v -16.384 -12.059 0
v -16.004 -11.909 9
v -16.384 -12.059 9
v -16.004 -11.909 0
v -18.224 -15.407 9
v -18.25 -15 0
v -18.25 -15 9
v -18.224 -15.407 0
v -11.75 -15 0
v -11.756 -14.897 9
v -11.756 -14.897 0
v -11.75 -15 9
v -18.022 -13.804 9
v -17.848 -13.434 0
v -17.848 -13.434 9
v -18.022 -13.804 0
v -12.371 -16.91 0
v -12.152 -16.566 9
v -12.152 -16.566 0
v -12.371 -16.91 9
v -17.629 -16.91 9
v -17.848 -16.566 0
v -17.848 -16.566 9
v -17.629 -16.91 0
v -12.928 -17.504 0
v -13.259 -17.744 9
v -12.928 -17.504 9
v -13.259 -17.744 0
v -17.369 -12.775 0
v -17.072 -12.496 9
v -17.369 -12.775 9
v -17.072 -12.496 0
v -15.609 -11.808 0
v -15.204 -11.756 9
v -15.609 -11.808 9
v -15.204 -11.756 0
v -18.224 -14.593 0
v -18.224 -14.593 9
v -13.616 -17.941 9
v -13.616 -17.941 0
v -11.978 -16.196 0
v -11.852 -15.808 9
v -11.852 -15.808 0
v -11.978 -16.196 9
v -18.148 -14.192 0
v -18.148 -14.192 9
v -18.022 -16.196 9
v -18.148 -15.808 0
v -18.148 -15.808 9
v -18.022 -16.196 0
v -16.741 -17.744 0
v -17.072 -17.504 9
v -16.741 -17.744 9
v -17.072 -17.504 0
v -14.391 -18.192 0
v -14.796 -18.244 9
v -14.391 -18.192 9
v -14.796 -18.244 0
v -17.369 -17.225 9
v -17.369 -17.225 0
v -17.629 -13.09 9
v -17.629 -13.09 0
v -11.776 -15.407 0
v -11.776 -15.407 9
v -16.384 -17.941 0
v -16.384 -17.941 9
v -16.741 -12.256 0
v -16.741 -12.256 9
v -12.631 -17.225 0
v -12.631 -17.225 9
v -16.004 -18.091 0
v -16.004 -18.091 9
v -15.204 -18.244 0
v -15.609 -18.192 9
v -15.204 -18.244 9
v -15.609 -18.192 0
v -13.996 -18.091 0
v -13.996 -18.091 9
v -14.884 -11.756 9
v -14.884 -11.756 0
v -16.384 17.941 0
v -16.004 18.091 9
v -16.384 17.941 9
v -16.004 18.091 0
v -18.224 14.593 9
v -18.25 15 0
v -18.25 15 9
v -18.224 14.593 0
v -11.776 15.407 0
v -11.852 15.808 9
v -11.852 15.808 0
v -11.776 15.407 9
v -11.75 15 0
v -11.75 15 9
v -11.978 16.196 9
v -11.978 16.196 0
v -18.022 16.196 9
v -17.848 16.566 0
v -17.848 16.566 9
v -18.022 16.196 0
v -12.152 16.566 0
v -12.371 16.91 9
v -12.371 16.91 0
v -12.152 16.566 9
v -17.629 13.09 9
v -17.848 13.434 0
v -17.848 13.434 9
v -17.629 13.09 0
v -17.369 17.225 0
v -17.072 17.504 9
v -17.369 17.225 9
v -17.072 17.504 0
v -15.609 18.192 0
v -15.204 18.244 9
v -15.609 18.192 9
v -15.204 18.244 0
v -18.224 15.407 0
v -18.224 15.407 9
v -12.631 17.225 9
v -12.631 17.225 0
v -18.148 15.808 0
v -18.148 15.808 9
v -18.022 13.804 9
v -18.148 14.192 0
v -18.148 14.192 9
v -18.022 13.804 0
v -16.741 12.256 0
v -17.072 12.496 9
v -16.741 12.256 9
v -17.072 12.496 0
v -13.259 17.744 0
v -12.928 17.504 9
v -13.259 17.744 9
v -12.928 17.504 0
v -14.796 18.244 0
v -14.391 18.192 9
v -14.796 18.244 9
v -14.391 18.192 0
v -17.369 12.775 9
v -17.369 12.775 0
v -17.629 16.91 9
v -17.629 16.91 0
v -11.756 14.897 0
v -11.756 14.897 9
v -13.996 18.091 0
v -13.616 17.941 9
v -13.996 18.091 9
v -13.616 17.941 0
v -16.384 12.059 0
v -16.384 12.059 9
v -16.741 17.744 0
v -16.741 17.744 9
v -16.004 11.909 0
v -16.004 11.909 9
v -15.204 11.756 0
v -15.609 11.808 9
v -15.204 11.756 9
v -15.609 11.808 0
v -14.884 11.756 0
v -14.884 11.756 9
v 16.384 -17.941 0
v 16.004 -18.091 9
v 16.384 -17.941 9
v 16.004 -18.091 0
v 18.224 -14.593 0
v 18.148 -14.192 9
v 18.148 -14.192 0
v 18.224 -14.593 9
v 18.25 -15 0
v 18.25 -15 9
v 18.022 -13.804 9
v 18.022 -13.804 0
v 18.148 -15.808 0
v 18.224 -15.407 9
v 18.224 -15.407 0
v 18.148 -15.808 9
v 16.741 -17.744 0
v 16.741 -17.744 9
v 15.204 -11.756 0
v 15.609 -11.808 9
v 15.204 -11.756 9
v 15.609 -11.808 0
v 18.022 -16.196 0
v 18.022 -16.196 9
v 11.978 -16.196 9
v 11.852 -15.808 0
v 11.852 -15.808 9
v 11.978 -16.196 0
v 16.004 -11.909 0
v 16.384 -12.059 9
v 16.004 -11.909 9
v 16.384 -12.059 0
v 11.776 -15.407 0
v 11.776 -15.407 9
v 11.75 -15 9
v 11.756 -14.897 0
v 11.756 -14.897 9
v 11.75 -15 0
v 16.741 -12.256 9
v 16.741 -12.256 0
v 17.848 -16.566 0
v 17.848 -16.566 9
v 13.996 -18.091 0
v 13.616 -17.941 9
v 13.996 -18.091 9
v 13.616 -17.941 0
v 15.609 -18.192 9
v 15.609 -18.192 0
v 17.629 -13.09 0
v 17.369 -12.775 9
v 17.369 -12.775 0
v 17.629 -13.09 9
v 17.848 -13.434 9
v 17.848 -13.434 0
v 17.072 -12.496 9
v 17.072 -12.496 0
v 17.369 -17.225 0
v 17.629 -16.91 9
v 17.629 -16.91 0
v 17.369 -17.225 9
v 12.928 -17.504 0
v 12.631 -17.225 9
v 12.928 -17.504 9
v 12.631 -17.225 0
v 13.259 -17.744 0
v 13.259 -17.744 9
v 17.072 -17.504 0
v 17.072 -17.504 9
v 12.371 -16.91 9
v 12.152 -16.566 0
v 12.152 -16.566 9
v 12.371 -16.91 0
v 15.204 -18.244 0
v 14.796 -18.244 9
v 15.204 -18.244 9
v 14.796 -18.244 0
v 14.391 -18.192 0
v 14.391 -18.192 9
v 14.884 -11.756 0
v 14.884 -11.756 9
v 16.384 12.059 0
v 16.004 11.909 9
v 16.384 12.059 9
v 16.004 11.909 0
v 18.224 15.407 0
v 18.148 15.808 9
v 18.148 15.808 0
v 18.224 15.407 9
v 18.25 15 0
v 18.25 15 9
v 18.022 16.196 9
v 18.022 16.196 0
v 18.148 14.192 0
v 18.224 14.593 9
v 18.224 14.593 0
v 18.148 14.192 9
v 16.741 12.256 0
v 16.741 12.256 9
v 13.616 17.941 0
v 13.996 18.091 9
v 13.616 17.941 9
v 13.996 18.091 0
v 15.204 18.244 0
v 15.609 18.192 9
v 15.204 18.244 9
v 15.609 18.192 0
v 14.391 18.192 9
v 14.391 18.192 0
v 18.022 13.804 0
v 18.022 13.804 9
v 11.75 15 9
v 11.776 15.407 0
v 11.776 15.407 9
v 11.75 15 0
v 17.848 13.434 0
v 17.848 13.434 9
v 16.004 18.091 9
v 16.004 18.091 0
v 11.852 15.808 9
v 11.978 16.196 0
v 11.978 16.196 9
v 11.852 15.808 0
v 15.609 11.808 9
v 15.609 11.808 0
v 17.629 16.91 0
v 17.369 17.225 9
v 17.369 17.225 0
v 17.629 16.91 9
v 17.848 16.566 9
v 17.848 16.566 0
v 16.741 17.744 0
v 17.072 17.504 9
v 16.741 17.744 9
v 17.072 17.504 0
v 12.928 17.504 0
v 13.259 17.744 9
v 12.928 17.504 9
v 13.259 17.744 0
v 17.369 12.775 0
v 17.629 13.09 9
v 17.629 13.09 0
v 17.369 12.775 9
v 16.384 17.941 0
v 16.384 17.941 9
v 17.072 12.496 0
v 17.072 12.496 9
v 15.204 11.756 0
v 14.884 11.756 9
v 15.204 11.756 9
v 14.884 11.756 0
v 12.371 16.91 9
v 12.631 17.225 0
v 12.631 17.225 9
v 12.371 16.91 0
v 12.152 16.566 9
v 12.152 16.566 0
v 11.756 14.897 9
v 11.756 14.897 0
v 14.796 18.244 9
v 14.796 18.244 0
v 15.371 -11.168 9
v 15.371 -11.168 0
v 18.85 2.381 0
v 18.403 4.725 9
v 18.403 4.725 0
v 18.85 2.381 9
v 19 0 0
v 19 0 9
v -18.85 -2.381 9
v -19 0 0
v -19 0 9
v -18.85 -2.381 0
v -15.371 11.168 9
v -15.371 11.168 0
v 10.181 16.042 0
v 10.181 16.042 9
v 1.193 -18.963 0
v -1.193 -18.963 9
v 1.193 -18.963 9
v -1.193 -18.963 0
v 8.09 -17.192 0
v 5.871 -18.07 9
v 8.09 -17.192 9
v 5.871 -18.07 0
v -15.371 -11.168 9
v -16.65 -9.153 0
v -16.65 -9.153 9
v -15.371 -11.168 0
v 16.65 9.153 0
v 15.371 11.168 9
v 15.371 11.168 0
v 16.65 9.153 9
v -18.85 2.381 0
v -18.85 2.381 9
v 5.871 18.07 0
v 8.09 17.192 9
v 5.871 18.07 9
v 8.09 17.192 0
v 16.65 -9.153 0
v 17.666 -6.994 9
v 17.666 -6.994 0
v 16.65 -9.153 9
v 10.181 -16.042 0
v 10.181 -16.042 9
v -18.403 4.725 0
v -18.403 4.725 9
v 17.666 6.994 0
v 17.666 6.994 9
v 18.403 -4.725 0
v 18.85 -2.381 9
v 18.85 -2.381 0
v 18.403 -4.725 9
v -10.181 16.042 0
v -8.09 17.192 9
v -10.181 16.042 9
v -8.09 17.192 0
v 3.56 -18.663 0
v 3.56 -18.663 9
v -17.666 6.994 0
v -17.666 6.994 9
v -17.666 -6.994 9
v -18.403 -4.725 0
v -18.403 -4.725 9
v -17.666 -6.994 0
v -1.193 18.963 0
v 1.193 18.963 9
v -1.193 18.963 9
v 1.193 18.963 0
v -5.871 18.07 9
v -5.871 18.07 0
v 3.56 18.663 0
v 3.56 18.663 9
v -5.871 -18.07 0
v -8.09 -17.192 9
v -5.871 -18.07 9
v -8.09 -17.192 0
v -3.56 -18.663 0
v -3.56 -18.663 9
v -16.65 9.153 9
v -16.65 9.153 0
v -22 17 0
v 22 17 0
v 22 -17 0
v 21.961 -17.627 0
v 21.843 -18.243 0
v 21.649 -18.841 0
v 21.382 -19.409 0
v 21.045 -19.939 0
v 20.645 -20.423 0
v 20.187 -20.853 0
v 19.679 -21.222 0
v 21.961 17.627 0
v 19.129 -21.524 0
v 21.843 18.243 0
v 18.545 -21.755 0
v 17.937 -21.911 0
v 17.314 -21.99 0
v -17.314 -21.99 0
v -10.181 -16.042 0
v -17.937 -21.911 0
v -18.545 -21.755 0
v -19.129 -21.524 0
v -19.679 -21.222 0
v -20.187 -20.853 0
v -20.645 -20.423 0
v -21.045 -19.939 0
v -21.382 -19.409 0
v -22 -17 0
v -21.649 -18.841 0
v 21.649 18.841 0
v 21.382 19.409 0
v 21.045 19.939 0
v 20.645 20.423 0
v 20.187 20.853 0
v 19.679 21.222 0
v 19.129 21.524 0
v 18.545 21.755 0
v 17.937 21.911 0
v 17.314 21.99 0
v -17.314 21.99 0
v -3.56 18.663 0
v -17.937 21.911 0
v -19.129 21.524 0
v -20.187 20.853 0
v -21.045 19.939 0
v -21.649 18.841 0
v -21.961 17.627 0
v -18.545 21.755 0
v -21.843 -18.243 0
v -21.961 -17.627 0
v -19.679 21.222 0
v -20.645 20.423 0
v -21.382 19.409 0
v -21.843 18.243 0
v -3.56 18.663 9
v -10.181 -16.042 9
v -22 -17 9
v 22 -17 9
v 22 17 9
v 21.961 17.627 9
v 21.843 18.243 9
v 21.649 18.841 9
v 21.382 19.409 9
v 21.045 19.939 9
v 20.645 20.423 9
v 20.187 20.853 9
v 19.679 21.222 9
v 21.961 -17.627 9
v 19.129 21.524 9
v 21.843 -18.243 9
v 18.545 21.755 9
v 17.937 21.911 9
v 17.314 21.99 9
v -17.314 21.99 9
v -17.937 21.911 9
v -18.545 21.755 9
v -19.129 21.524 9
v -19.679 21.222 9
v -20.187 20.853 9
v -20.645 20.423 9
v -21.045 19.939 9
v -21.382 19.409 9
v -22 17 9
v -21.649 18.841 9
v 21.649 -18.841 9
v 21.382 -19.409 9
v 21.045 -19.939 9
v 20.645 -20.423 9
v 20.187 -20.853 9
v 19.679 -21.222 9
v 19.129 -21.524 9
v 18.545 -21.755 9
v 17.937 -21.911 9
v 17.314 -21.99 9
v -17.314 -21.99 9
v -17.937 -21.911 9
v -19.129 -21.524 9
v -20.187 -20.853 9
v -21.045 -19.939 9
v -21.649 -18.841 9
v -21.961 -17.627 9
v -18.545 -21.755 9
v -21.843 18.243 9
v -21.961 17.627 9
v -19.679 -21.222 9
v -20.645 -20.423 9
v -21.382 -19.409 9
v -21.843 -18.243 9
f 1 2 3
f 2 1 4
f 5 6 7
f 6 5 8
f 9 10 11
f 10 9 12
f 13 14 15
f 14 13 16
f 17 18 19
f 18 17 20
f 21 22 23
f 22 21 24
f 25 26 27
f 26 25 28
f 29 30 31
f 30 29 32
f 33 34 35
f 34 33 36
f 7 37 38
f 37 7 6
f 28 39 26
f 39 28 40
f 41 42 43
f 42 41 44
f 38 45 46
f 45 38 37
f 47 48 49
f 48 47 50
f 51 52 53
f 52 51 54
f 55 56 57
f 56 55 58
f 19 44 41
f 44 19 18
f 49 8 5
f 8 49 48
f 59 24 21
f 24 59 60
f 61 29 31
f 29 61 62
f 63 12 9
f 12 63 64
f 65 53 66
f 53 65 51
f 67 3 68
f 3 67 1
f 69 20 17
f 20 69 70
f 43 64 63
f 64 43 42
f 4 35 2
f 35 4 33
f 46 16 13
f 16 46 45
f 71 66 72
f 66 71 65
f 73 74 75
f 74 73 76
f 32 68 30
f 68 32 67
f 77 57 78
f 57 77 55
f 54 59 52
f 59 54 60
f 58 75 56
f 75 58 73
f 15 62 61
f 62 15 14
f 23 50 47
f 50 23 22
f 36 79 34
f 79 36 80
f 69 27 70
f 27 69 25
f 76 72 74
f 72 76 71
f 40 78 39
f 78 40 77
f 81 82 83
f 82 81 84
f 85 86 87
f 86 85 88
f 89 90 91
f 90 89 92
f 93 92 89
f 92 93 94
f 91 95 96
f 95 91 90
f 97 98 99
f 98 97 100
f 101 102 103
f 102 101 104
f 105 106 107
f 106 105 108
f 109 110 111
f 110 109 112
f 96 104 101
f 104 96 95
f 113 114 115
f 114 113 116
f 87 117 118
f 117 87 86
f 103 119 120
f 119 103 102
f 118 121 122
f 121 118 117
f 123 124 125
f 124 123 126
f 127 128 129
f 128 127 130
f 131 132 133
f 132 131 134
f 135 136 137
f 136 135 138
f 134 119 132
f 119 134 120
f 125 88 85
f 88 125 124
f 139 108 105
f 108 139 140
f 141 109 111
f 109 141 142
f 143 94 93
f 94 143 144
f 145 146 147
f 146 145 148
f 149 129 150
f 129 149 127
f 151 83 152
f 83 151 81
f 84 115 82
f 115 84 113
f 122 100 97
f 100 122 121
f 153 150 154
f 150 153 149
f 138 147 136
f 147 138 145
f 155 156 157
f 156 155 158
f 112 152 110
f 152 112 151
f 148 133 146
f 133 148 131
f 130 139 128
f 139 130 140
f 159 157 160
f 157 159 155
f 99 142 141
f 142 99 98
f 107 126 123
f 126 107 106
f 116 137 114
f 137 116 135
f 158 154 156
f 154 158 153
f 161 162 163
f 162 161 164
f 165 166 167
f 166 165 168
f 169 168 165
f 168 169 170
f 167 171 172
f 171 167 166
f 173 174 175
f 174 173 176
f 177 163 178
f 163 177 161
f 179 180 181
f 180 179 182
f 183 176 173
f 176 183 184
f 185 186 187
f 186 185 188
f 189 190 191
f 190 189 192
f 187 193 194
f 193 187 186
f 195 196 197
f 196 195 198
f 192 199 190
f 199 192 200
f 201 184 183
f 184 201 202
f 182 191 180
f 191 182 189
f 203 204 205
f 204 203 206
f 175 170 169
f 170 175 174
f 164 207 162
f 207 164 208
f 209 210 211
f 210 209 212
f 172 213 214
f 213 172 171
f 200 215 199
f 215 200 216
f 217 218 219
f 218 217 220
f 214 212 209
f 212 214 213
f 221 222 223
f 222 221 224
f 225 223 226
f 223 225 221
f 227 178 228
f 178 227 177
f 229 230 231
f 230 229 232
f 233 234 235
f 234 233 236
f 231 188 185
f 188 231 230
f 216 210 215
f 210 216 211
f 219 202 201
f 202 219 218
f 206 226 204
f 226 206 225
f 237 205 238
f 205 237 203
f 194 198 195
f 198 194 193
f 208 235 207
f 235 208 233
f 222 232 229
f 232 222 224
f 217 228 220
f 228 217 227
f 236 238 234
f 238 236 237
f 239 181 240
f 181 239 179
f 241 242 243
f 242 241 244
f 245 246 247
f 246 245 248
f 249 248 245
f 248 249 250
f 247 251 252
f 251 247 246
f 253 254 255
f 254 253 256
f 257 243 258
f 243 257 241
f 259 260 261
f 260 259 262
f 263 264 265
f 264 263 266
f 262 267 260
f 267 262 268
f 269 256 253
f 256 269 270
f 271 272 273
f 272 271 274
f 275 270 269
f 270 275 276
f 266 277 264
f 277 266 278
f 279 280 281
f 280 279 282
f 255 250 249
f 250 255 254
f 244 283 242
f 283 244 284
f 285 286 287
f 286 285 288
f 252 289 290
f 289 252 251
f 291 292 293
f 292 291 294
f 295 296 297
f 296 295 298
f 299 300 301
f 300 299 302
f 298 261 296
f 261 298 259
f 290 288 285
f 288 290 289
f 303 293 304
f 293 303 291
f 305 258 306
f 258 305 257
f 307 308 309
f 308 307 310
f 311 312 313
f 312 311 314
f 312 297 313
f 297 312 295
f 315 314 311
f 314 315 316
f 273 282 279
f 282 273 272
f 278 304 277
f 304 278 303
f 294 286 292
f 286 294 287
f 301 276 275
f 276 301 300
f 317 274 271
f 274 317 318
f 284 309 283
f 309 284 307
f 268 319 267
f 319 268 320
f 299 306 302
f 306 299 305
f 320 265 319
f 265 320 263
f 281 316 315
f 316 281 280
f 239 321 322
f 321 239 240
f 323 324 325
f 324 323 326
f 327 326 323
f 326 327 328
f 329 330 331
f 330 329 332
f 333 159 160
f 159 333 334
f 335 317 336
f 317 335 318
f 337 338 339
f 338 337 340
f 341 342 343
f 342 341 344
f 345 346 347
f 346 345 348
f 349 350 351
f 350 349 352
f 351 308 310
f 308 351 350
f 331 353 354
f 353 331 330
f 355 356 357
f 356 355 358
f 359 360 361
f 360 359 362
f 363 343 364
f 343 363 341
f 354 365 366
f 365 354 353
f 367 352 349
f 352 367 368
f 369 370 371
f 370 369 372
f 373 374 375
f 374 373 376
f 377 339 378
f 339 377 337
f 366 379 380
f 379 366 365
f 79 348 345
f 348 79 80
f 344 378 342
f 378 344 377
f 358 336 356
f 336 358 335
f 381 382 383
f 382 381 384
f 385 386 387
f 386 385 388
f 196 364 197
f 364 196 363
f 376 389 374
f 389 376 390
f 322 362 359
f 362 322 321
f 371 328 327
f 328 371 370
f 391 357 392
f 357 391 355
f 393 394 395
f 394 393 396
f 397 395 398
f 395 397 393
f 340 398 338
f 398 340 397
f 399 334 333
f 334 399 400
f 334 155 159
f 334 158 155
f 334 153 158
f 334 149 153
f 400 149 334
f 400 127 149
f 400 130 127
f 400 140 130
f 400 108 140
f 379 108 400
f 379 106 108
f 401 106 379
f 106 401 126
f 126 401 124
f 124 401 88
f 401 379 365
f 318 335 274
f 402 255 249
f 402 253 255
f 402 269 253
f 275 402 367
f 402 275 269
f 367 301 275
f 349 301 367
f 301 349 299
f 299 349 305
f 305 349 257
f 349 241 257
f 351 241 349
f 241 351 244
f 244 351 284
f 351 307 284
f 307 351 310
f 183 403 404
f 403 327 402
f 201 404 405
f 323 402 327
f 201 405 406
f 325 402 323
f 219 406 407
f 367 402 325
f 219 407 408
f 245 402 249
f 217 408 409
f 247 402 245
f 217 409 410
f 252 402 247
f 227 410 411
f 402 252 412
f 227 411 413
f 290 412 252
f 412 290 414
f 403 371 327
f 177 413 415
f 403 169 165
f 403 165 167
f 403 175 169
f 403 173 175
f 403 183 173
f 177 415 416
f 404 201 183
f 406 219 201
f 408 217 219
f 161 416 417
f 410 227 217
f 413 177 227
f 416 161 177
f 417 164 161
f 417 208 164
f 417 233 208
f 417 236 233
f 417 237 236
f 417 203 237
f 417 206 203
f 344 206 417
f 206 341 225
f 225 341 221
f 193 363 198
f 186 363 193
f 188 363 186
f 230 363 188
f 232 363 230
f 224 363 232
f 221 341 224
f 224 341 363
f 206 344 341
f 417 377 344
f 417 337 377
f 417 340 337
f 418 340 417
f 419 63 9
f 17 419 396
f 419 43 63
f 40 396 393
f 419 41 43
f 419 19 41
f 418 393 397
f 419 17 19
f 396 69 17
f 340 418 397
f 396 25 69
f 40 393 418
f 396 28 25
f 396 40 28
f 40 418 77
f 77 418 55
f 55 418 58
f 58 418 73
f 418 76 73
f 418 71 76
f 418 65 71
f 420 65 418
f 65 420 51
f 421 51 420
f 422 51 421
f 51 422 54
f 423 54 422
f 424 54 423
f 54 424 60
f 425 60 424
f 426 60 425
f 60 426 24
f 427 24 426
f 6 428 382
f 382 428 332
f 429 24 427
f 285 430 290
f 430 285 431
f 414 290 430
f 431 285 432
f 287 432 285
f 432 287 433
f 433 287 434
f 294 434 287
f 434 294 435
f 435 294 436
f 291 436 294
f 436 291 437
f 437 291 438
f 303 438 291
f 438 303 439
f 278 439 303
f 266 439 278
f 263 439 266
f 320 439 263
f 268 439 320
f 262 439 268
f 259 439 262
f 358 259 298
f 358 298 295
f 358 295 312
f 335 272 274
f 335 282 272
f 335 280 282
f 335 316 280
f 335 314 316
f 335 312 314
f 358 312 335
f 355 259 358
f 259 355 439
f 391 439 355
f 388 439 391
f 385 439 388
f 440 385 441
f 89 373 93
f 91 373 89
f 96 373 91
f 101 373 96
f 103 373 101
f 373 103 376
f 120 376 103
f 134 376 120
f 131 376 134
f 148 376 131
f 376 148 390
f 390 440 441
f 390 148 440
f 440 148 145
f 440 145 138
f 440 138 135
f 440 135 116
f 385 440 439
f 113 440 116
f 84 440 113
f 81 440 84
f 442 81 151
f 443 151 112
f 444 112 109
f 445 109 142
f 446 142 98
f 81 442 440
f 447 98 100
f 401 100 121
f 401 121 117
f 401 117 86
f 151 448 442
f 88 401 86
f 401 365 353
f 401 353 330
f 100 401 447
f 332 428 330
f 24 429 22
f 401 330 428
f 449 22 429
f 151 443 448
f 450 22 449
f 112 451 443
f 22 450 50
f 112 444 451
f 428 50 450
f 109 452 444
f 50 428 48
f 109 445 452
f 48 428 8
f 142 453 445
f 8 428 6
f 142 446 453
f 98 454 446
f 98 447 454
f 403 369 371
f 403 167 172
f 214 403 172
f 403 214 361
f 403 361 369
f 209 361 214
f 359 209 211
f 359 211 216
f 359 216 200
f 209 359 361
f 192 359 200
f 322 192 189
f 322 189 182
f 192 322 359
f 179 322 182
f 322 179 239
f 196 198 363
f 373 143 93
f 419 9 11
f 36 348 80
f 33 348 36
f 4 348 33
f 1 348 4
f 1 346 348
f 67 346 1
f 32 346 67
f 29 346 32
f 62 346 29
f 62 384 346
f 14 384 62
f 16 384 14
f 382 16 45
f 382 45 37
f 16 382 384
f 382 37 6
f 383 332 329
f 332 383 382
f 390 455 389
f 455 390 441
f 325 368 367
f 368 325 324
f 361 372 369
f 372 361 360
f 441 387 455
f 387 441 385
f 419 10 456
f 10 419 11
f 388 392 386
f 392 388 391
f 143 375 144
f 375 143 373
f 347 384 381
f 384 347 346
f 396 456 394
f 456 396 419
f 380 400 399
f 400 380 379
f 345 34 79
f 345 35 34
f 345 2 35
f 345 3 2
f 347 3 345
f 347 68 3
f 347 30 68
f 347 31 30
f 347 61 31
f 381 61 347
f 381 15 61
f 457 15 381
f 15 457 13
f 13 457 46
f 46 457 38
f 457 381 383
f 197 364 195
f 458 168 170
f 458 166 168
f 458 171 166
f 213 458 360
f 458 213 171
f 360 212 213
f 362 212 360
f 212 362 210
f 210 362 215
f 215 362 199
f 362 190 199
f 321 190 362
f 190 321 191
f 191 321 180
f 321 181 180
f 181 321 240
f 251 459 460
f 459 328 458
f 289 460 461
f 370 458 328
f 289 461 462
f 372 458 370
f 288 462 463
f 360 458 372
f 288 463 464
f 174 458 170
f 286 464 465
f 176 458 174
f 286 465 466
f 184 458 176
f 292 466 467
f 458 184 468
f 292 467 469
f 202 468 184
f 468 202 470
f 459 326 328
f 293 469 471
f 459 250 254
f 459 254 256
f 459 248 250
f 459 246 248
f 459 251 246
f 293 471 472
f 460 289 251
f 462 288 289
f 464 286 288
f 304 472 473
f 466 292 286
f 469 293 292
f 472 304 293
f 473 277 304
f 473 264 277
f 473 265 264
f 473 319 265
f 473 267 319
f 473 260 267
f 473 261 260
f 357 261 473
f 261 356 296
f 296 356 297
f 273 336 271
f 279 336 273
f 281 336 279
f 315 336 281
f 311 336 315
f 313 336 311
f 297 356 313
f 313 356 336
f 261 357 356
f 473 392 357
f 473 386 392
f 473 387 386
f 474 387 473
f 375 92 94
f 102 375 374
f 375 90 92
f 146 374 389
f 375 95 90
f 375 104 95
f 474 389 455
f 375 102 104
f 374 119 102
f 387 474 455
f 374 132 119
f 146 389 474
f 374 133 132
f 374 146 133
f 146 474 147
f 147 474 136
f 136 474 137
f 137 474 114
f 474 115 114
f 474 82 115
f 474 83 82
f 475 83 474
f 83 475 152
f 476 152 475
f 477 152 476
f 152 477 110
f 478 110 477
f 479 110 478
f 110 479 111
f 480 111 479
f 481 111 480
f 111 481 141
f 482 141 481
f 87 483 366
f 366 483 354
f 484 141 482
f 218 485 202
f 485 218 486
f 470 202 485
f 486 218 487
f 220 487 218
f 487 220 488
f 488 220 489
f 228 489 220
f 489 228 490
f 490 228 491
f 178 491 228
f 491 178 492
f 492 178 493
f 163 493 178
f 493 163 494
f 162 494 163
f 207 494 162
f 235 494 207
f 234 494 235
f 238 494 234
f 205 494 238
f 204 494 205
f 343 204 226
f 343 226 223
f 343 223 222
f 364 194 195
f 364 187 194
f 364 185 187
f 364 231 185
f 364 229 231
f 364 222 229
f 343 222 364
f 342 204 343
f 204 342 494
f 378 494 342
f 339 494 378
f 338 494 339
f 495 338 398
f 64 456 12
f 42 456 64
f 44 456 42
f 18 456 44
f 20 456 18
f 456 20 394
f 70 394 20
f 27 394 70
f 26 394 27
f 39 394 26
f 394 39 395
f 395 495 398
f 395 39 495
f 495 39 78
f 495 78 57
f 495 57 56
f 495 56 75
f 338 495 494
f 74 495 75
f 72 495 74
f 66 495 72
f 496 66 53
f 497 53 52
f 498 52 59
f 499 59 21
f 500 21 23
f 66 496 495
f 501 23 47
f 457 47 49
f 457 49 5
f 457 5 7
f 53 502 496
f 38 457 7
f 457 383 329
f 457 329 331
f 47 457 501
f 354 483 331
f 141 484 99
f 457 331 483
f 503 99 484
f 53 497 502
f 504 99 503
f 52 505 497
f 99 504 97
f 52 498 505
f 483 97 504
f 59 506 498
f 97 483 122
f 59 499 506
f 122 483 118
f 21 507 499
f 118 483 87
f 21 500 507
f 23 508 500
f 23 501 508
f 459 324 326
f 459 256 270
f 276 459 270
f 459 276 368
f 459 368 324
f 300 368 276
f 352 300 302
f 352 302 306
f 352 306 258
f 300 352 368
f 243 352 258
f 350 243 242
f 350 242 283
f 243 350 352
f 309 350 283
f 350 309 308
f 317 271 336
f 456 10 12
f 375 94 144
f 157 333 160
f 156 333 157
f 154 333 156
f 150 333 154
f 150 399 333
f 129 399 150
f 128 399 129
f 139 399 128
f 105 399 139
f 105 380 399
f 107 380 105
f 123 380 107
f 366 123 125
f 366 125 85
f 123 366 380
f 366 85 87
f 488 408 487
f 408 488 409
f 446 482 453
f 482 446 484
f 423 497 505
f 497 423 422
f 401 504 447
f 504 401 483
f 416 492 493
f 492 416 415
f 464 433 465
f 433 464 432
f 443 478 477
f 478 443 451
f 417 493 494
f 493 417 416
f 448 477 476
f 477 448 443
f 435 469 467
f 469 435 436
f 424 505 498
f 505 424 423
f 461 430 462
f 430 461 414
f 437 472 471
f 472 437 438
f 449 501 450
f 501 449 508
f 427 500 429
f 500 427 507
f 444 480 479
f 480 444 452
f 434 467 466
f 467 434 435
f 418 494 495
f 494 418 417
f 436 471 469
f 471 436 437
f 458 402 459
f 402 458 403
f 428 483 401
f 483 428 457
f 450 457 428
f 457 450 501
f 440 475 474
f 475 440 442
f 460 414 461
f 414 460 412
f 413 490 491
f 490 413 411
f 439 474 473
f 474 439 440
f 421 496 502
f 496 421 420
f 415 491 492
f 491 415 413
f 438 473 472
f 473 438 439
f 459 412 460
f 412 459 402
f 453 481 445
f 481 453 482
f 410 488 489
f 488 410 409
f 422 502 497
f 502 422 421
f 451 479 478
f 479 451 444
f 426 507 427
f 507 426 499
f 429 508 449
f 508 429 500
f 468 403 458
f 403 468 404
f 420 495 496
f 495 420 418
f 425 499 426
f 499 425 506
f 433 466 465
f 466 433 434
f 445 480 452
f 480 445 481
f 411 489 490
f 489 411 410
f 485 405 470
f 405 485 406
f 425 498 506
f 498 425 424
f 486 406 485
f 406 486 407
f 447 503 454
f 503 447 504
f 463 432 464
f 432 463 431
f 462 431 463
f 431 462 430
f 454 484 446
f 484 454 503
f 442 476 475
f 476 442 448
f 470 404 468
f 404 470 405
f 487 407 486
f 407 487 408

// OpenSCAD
$fn = 50;


difference() {
	union() {
		hull() {
			translate(v = [-17.0000000000, 17.0000000000, 0]) {
				cylinder(h = 9, r = 5);
			}
			translate(v = [17.0000000000, 17.0000000000, 0]) {
				cylinder(h = 9, r = 5);
			}
			translate(v = [-17.0000000000, -17.0000000000, 0]) {
				cylinder(h = 9, r = 5);
			}
			translate(v = [17.0000000000, -17.0000000000, 0]) {
				cylinder(h = 9, r = 5);
			}
		}
	}
	union() {
		#translate(v = [-15.0000000000, -15.0000000000, -100.0000000000]) {
			cylinder(h = 200, r = 3.2500000000);
		}
		#translate(v = [-15.0000000000, 15.0000000000, -100.0000000000]) {
			cylinder(h = 200, r = 3.2500000000);
		}
		#translate(v = [15.0000000000, -15.0000000000, -100.0000000000]) {
			cylinder(h = 200, r = 3.2500000000);
		}
		#translate(v = [15.0000000000, 15.0000000000, -100.0000000000]) {
			cylinder(h = 200, r = 3.2500000000);
		}
		#cylinder(h = 9, r = 19.0000000000);
	}
}
